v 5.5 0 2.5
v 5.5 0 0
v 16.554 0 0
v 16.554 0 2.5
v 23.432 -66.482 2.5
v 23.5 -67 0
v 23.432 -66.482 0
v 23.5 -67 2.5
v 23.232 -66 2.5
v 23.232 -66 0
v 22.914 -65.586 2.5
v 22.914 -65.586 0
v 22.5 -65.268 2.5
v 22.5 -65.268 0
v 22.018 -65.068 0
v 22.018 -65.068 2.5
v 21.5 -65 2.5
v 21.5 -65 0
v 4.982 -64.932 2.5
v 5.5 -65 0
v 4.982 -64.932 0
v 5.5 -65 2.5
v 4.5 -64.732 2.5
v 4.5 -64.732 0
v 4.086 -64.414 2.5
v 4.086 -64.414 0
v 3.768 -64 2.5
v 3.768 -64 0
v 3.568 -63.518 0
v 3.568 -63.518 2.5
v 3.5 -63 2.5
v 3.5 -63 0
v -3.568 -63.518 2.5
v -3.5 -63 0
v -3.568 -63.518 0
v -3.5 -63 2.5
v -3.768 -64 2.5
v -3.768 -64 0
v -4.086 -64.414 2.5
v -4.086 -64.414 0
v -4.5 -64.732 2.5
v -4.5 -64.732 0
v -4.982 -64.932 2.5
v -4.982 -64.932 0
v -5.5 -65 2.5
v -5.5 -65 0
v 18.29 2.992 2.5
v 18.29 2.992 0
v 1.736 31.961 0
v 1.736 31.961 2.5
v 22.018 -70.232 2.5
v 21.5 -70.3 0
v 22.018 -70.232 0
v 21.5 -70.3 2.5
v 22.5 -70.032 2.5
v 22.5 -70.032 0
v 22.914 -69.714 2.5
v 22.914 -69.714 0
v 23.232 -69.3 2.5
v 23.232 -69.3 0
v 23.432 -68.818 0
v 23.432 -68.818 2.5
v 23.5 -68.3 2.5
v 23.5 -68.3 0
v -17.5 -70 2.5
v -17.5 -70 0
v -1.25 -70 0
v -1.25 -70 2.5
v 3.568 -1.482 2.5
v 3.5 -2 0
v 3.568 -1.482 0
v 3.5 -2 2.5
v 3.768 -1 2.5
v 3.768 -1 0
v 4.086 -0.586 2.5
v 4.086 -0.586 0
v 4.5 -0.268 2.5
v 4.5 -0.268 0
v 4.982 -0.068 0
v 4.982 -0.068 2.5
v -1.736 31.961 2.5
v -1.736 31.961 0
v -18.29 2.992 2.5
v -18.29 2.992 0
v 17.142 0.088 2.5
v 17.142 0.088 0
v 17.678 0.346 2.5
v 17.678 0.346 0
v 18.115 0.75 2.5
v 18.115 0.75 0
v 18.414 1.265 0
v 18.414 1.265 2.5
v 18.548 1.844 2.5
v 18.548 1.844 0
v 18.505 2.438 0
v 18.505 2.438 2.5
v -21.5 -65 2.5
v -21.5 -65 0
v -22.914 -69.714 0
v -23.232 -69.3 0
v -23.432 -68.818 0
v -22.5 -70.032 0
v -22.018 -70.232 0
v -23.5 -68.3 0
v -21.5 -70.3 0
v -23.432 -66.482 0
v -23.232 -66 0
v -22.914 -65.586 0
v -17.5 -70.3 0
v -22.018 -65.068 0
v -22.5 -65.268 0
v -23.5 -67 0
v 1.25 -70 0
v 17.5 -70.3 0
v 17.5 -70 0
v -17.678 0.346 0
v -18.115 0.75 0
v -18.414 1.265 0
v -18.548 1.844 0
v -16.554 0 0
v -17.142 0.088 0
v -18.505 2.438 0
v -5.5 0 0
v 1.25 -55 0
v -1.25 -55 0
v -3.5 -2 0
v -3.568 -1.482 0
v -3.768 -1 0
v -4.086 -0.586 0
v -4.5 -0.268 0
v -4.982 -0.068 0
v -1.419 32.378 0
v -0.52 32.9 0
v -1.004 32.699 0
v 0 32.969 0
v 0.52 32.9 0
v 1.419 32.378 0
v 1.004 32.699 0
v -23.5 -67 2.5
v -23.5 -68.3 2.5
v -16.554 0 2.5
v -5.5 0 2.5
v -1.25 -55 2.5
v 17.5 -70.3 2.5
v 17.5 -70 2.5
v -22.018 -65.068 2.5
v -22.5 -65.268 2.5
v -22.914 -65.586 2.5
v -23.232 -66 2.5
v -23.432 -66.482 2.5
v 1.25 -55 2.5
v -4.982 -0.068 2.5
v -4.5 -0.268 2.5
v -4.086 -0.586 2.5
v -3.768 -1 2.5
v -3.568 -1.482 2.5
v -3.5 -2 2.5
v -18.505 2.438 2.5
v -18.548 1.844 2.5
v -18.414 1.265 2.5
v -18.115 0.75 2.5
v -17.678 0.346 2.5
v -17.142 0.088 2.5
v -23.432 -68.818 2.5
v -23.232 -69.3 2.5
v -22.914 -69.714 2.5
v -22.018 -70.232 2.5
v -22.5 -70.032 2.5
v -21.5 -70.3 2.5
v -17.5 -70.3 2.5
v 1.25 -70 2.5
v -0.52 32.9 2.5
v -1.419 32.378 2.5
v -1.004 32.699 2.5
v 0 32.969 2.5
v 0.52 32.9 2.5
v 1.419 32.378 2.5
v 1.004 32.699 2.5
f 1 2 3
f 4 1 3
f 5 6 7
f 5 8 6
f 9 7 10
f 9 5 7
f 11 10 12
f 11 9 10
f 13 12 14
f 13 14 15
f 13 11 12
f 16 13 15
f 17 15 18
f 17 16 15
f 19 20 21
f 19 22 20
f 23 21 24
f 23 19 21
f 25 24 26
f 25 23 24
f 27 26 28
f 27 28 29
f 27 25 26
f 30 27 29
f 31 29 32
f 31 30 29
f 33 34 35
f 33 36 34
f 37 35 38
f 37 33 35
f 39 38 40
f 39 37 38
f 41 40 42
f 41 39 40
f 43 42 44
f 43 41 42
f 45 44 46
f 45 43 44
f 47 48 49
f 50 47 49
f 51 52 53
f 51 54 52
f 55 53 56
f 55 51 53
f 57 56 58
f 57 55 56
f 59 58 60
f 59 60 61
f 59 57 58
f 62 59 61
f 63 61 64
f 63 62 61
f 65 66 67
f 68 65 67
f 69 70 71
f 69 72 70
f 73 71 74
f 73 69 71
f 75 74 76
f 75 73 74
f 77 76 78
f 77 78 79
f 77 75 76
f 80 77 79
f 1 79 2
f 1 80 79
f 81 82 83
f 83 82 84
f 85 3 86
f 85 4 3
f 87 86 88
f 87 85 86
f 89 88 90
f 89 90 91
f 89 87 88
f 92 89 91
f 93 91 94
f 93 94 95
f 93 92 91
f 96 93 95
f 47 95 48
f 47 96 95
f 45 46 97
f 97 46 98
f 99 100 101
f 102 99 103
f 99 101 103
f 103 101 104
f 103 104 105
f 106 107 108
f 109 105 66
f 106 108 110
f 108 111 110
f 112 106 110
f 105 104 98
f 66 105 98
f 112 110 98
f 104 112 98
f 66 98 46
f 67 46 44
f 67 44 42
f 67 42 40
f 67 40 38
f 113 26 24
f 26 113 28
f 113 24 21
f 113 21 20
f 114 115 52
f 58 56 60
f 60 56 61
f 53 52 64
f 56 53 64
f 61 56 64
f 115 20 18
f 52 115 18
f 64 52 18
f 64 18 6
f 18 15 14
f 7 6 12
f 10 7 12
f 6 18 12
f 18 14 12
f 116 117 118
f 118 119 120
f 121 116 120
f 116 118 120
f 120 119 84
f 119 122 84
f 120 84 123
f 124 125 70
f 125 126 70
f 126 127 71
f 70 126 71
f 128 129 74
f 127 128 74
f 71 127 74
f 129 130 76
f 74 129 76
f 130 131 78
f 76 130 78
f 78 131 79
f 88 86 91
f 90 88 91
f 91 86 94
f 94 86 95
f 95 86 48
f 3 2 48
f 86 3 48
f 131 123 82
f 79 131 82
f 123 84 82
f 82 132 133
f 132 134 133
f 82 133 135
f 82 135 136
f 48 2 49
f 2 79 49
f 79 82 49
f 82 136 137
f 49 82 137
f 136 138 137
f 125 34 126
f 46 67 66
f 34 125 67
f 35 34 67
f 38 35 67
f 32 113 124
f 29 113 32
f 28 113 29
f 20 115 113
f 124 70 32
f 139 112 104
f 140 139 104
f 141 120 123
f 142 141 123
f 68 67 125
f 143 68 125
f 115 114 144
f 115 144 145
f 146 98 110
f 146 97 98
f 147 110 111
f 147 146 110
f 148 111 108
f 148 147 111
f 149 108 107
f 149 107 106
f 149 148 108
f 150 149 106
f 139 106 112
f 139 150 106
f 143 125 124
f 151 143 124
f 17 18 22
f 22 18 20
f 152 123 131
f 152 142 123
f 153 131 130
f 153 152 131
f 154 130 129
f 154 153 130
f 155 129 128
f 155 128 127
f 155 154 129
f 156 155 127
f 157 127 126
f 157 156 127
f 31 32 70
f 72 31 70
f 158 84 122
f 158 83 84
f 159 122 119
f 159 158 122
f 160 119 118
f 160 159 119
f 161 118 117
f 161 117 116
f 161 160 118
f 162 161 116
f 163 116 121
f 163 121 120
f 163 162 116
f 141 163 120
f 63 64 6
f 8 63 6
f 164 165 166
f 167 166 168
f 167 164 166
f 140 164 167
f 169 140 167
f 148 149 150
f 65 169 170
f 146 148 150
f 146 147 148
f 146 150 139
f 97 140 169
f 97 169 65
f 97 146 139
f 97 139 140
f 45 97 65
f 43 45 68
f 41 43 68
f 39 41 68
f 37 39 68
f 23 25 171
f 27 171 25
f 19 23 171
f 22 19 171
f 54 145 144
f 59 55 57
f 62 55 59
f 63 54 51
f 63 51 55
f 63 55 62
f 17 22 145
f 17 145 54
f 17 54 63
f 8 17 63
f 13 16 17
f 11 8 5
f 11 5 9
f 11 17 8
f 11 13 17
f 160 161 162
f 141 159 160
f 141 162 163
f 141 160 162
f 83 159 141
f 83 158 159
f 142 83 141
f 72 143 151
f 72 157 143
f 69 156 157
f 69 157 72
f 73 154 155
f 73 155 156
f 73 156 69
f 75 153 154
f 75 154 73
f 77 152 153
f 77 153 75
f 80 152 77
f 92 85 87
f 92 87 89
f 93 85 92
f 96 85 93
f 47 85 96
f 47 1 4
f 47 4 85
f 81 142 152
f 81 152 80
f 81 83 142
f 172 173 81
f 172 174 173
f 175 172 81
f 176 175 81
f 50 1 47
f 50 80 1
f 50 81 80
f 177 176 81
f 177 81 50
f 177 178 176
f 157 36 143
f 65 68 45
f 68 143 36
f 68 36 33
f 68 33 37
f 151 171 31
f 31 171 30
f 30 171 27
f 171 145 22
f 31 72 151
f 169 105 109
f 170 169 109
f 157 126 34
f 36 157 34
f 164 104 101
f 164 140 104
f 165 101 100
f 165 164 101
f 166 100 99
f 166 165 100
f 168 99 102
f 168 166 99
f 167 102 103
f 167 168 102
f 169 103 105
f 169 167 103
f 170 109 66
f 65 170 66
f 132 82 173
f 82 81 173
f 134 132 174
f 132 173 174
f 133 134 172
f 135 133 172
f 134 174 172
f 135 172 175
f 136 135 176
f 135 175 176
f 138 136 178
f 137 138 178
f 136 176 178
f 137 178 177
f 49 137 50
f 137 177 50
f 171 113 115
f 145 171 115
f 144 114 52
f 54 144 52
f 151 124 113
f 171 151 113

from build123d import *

# Parameters (mm, degrees)
F0_W     = 6
F0_H     = 0.3
F1_DEPTH = 2.5
F2_R     = 2


with BuildPart() as f1:
    # F0 (on Top) → F1 (new body)
    with BuildSketch(Plane.XY):
        Polygon((0, 35), (-20, 0), (-3.5, 0), (3.5, 0), (20, 0), align=None)
        Polygon((3.5, 0), (-3.5, 0), (-3.5, -65), (-23.5, -65), (-23.5, -70), (-17.5, -70), (-1.25, -70), (-1.25, -55), (1.25, -55), (1.25, -70), (17.5, -70), (23.5, -70), (23.5, -65), (3.5, -65), align=None)
        with Locations((-20.5, -70.15)):
            Rectangle(F0_W, F0_H)
        with Locations((20.5, -70.15)):
            Rectangle(F0_W, F0_H)
    extrude(amount=F1_DEPTH)

    # F2
    f2_edges = [f1.edges().sort_by_distance(p)[0] for p in [
        (-3.5, 0, 1.25),
        (3.5, 0, 1.25),
        (20, 0, 1.25),
        (-20, 0, 1.25),
        (0, 35, 1.25),
        (3.5, -65, 1.25),
        (-3.5, -65, 1.25),
        (-23.5, -65, 1.25),
        (23.5, -65, 1.25),
        (-23.5, -70.3, 1.25),
        (23.5, -70.3, 1.25),
    ]]
    fillet(f2_edges, radius=F2_R)


solid = f1.part
